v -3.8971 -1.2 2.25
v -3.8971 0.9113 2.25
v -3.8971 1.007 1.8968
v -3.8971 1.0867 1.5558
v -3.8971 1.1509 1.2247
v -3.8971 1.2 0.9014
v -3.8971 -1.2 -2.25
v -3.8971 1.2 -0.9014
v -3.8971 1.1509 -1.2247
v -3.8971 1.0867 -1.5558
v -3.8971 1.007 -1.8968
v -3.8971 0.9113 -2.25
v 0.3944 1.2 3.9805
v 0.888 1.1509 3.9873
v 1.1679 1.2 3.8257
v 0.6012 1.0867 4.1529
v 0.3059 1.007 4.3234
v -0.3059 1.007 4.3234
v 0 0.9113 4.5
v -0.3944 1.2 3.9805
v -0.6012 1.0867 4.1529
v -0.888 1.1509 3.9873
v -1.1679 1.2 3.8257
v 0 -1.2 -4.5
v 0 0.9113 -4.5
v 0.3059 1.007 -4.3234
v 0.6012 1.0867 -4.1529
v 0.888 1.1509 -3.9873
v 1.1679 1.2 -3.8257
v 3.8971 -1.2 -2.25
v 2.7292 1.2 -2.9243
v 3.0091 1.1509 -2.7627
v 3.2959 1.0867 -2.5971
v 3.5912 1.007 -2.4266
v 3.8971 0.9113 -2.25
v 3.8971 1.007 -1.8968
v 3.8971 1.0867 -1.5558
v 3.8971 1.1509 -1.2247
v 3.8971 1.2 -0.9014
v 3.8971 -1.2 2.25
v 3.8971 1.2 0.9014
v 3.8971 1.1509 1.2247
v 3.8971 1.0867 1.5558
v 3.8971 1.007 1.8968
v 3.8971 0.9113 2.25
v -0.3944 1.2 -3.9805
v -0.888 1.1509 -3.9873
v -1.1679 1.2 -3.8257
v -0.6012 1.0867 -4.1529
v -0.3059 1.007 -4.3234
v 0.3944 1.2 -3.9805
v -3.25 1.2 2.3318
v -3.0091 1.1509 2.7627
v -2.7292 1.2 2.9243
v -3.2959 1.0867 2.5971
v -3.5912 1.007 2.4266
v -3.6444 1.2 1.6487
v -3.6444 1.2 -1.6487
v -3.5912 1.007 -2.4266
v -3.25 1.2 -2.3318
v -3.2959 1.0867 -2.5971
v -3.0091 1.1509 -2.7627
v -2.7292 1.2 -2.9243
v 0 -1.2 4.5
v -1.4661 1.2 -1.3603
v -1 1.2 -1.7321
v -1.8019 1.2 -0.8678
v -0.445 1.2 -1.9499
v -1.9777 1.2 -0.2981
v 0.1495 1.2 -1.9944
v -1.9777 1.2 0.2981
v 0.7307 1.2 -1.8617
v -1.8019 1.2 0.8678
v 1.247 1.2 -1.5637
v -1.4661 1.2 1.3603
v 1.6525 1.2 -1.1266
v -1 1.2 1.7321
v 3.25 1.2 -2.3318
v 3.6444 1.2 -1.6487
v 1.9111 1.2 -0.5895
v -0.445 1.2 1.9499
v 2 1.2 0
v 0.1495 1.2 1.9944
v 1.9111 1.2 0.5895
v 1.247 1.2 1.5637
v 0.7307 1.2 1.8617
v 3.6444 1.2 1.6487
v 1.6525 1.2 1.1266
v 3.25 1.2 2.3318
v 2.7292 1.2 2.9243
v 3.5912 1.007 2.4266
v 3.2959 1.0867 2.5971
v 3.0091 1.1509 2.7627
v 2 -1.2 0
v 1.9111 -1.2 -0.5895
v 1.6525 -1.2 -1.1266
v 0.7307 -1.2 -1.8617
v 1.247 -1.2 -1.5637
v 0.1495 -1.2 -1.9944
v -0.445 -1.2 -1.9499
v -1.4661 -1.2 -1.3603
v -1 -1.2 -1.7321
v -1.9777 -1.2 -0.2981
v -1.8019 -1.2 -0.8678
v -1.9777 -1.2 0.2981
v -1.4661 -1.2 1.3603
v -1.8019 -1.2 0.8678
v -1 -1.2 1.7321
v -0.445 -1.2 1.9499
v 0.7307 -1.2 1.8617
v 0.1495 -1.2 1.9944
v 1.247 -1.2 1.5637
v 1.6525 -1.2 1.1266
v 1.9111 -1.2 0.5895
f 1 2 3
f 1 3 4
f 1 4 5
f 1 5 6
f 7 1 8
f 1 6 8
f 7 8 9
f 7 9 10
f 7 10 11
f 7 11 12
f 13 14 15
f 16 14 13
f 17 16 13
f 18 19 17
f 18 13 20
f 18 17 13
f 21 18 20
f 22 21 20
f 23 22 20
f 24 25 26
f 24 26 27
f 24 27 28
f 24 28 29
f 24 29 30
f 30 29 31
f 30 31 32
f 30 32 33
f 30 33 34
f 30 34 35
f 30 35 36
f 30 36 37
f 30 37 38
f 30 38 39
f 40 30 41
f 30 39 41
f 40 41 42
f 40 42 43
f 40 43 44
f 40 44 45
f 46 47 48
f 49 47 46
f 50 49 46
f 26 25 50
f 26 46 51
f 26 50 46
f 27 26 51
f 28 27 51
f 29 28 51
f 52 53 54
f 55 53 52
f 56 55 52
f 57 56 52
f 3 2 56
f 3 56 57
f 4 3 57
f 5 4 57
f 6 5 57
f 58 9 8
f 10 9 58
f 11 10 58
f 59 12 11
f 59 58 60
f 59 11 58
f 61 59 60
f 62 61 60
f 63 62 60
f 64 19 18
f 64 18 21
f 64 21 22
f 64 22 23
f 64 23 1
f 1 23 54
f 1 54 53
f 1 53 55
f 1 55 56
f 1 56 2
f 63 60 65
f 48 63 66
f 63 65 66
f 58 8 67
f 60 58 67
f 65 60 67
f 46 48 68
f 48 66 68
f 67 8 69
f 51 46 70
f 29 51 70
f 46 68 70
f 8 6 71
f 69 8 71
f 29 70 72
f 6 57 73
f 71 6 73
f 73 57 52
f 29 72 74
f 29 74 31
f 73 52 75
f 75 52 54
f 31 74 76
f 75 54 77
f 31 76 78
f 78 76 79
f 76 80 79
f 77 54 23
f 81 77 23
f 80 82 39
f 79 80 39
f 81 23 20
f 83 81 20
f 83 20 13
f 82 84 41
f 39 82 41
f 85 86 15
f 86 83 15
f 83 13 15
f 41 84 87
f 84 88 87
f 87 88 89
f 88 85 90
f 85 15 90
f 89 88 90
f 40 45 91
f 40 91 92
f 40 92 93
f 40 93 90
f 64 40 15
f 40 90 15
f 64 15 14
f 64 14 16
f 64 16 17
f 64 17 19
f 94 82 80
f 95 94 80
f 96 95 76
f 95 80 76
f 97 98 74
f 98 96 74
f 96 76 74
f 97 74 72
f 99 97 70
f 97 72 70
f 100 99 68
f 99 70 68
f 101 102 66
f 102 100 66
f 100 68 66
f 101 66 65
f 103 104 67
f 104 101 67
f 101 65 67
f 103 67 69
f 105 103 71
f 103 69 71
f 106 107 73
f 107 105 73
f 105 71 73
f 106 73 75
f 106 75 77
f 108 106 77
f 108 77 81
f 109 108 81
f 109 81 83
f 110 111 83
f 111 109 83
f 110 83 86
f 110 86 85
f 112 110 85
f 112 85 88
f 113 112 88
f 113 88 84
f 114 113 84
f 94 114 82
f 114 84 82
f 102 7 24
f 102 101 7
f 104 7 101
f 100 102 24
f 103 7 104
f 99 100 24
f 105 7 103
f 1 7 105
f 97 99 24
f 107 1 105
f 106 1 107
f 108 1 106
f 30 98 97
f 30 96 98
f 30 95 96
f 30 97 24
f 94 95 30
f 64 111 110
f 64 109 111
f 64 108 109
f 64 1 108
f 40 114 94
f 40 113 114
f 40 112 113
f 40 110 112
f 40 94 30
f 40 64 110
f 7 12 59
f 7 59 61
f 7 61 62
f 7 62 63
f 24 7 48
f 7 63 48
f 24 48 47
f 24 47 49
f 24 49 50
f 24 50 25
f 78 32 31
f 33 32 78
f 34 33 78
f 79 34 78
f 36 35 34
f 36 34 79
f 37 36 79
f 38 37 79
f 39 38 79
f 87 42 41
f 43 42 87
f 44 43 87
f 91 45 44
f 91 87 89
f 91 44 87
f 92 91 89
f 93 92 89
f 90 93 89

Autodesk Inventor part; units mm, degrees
ref_plane "YZ Plane" through (0, 0, 0) normal (1, 0, 0) x (0, 1, 0)
ref_plane "XZ Plane" through (0, 0, 0) normal (0, 1, 0) x (-1, 0, 0)
ref_plane "XY Plane" through (0, 0, 0) normal (0, 0, 1) x (1, 0, 0)
sketch "スケッチ1" plane through (0, 0, 0) normal (0, 0, 1) x (1, 0, 0)
  line L0 (2, 1.2) -> (4, 1.2)
  line L1 (4.5, 0.9113) -> (4.5, -1.2)
  line L2 (4.5, -1.2) -> (2, -1.2)
  line L3 (2, -1.2) -> (2, 1.2)
  line L4 (0, 1.2) -> (0, -1.2)
  line L5 (4, 1.2) -> (4.5, 0.9113)
  point P0 (0, 0)
  dimension "d0" = 1.2
  dimension "d1" = 2.4
  dimension "d2" = 2
  dimension "d3" = 4.5
  dimension "d4" = 2
  dimension "d5" = 30
revolve "回転1" add sketch "スケッチ1" angle 360 about axis through (0, 1.2, 0) along (0, -1, 0)
sketch "スケッチ2" plane through (0, 1.2, 0) normal (0, 1, 0) x (1, 0, 0)
  circle A0 centre (0, 0) radius 2 projected
  line L0 (0, 4.5) -> (3.8971, 2.25)
  line L1 (3.8971, 2.25) -> (3.8971, -2.25)
  line L2 (3.8971, -2.25) -> (0, -4.5)
  line L3 (0, -4.5) -> (-3.8971, -2.25)
  line L4 (-3.8971, -2.25) -> (-3.8971, 2.25)
  line L5 (-3.8971, 2.25) -> (0, 4.5)
  dimension "d7" = 4.5
extrude "押し出し1" cut sketch "スケッチ2" against normal blind 2.4 keep common part
thread "ねじ2" size "M4x0.7" class "6H" standard "ANSI Metric M Profile" full length
properties material "ステンレス鋼"
